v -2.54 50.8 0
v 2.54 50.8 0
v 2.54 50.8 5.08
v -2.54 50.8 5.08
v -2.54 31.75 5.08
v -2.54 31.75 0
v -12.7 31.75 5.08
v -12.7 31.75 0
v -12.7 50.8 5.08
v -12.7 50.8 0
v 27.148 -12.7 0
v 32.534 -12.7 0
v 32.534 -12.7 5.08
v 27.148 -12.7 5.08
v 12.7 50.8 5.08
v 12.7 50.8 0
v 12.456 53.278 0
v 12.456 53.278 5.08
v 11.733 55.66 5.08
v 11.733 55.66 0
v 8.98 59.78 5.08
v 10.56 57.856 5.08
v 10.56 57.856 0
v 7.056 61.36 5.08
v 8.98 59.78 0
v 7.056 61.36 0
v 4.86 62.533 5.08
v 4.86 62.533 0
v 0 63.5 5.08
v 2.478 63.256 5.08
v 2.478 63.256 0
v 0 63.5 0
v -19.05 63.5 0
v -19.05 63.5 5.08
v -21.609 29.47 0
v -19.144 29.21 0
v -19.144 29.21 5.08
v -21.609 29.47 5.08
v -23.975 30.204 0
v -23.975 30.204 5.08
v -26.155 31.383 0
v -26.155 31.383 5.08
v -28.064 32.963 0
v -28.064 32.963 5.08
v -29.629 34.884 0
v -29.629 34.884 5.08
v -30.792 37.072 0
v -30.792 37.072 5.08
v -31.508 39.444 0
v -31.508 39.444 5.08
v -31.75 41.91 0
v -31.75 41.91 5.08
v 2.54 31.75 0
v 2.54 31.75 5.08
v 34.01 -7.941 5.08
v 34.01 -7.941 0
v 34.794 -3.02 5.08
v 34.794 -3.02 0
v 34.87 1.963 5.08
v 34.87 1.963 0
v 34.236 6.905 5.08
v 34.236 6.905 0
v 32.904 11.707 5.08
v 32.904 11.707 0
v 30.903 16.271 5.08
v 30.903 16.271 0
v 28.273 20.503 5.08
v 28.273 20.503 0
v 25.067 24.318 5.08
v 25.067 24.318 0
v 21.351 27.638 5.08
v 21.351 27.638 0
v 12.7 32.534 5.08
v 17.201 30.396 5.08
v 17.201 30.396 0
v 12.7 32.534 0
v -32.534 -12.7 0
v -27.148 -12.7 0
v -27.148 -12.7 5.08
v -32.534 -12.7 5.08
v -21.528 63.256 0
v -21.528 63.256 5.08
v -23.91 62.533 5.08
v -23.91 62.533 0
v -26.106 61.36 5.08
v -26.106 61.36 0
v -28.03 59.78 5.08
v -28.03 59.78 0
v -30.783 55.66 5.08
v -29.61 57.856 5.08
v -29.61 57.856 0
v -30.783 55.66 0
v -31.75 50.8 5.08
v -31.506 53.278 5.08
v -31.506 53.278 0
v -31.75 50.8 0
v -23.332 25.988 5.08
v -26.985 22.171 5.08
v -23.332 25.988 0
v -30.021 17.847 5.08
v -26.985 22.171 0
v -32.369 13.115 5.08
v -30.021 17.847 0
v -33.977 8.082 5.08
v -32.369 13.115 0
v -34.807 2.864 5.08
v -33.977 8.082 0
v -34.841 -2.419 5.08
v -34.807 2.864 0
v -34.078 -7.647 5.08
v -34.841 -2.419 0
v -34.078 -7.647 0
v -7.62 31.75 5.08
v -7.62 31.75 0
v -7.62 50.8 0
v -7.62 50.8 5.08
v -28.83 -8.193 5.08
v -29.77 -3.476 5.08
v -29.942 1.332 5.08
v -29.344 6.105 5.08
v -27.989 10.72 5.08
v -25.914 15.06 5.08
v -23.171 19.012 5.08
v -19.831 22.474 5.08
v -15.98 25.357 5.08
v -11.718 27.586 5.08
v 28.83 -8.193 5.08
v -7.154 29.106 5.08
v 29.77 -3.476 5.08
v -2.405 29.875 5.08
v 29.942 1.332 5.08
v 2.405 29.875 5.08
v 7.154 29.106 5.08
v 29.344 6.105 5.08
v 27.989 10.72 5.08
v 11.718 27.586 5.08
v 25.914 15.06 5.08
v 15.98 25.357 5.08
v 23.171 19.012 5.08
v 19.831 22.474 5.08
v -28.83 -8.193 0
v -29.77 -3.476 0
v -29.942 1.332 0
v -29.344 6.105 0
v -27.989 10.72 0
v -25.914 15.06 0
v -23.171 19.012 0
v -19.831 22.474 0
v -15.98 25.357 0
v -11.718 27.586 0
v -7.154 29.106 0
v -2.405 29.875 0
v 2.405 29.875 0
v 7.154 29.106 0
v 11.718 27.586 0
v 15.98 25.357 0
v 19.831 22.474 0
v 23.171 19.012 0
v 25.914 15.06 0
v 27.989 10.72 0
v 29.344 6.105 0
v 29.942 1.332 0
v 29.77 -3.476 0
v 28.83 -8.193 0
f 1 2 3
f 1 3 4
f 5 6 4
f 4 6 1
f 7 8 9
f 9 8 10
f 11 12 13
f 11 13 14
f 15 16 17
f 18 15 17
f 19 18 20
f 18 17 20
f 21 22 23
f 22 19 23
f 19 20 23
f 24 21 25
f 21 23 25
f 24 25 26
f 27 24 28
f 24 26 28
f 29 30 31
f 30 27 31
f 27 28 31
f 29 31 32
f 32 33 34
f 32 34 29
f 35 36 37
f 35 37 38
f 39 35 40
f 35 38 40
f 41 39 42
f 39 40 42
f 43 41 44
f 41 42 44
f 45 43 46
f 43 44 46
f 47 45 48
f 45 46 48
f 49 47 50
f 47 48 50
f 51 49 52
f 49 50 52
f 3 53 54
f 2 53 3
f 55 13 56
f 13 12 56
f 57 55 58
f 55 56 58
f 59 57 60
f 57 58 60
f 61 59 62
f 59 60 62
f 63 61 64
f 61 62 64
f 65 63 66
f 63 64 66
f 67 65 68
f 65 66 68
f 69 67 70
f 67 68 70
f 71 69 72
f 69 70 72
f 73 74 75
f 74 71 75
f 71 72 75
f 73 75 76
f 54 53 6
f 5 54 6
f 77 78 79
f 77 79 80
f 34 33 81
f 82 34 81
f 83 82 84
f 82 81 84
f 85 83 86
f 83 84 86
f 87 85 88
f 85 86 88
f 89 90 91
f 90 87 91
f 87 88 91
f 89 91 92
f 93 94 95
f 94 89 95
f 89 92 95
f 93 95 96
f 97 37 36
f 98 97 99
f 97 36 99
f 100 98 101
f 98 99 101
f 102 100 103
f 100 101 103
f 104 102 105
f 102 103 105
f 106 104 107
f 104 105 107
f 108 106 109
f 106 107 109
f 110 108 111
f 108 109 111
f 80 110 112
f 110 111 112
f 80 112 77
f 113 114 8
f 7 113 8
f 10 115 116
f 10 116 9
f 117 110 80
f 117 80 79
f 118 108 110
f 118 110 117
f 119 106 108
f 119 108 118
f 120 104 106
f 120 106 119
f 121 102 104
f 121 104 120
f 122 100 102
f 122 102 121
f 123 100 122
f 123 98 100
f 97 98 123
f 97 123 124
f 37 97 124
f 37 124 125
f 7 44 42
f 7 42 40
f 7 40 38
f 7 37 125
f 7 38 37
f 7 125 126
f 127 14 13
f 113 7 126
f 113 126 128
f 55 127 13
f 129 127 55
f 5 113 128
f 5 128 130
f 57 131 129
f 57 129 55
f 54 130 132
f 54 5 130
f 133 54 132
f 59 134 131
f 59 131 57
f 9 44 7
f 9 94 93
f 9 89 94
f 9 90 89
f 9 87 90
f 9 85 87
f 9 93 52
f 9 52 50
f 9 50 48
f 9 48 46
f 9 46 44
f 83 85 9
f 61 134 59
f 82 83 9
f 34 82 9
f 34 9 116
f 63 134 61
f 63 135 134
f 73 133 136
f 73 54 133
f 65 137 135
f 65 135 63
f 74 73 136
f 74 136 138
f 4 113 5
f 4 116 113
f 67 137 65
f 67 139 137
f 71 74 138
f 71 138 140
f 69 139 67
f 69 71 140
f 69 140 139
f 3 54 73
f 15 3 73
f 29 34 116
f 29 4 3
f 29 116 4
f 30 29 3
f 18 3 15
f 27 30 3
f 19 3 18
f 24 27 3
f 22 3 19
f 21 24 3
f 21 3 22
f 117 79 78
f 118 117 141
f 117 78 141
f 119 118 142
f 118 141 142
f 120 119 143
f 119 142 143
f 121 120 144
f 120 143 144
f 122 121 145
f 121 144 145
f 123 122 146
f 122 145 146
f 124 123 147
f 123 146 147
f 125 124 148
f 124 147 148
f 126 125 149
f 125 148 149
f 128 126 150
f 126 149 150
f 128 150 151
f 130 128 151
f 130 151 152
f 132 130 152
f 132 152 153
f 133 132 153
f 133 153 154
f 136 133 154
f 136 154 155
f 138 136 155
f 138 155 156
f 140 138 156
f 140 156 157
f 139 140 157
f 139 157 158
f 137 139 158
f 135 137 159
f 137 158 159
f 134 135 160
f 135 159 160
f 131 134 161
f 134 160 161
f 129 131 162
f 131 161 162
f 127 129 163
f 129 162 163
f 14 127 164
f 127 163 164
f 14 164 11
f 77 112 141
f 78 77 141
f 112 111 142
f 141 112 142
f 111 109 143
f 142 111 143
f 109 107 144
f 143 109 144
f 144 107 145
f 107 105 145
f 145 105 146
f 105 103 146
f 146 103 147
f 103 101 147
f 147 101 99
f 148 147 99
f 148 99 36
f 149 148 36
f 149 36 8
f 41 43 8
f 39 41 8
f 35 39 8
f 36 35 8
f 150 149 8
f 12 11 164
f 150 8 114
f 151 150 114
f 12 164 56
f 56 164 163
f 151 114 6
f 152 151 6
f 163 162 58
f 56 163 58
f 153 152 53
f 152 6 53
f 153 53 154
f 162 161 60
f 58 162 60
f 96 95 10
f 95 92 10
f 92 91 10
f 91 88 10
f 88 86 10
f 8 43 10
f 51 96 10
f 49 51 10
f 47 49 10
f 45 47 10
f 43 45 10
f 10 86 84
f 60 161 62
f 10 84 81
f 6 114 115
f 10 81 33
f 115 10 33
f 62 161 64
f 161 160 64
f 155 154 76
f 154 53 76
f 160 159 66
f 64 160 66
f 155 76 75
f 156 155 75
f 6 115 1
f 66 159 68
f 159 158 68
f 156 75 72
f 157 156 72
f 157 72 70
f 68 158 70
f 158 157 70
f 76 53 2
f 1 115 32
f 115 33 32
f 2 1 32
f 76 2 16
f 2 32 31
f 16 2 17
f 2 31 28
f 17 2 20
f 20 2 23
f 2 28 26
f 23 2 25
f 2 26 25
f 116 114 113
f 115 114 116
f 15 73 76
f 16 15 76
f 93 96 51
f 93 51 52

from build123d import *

# Parameters (mm, degrees)
SKETCH1_R           = 34.925
BOSS_EXTRUDE1_DEPTH = 5.08
SKETCH2_W           = 25.4
SKETCH2_H           = 5.08
BOSS_EXTRUDE2_DEPTH = 63.5
SKETCH3_R           = 29.972
CUT_EXTRUDE1_DEPTH  = 50.8
SKETCH4_W           = 5.08
SKETCH4_H           = 19.05
CUT_EXTRUDE2_DEPTH  = 50.8
SKETCH5_W           = 129.040366972
SKETCH5_H           = 73.118289239
CUT_EXTRUDE3_DEPTH  = 50.8
SKETCH6_W           = 5.08
SKETCH6_H           = 34.29
BOSS_EXTRUDE3_DEPTH = 19.05
SKETCH7_W           = 5.08
SKETCH7_H           = 19.05
CUT_EXTRUDE4_DEPTH  = 19.05
FILLET1_R           = 12.7


with BuildPart() as part:
    # Sketch1 → Boss-Extrude1 (new body)
    with BuildSketch(Plane.XY):
        Circle(SKETCH1_R)
    extrude(amount=BOSS_EXTRUDE1_DEPTH)

    # Sketch2 → Boss-Extrude2 (add)
    with BuildSketch(Plane(origin=(0, 0, 0), x_dir=(1, 0, 0), z_dir=(0, 1, 0))):
        with Locations((0, -2.54)):
            Rectangle(SKETCH2_W, SKETCH2_H)
    extrude(amount=BOSS_EXTRUDE2_DEPTH)

    # Sketch3 → Cut-Extrude1 (cut)
    with BuildSketch(Plane(origin=(0, 0, 0), x_dir=(-1, 0, 0), z_dir=(0, 0, -1))):
        Circle(SKETCH3_R)
    extrude(amount=-CUT_EXTRUDE1_DEPTH, mode=Mode.SUBTRACT)

    # Sketch4 → Cut-Extrude2 (cut)
    with BuildSketch(Plane(origin=(0, 0, 0), x_dir=(-1, 0, 0), z_dir=(0, 0, -1))):
        with Locations((0, 41.275)):
            Rectangle(SKETCH4_W, SKETCH4_H)
    extrude(amount=-CUT_EXTRUDE2_DEPTH, mode=Mode.SUBTRACT)

    # Sketch5 → Cut-Extrude3 (cut)
    with BuildSketch(Plane(origin=(0, 0, 0), x_dir=(-1, 0, 0), z_dir=(0, 0, -1))):
        with Locations((0.982448892, -49.25914462)):
            Rectangle(SKETCH5_W, SKETCH5_H)
    extrude(amount=-CUT_EXTRUDE3_DEPTH, mode=Mode.SUBTRACT)

    # Sketch6 → Boss-Extrude3 (add)
    with BuildSketch(Plane.ZY.offset(12.7)):
        with Locations((2.54, 46.355)):
            Rectangle(SKETCH6_W, SKETCH6_H)
    extrude(amount=BOSS_EXTRUDE3_DEPTH)

    # Sketch7 → Cut-Extrude4 (cut)
    with BuildSketch(Plane(origin=(0, 0, 0), x_dir=(-1, 0, 0), z_dir=(0, 0, -1))):
        with Locations((10.16, 41.275)):
            Rectangle(SKETCH7_W, SKETCH7_H)
    extrude(amount=-CUT_EXTRUDE4_DEPTH, mode=Mode.SUBTRACT)

    # Fillet1
    # the kernel refuses this fillet: 12.7 mm, written as the material it takes off along each edge
    with BuildSketch(Plane(origin=(12.7, 63.5, -31.75), x_dir=(-1, 0, 0), z_dir=(0, 0, 1))) as fillet1_piece_1:
        with BuildLine():
            CenterArc((FILLET1_R, FILLET1_R), FILLET1_R, 180, 90)
            Line((0, FILLET1_R), (0, 0))
            Line((0, 0), (FILLET1_R, 0))
        make_face()
    extrude(amount=68.58, mode=Mode.SUBTRACT)
    with BuildSketch(Plane(origin=(-31.75, 63.5, -31.75), x_dir=(1, 0, 0), z_dir=(0, 0, 1))) as fillet1_piece_2:
        with BuildLine():
            CenterArc((FILLET1_R, -FILLET1_R), FILLET1_R, 90, 90)
            Line((0, -FILLET1_R), (0, 0))
            Line((0, 0), (FILLET1_R, 0))
        make_face()
    extrude(amount=68.58, mode=Mode.SUBTRACT)
    with BuildSketch(Plane(origin=(-31.75, 29.21, 36.83), x_dir=(0, 1, 0), z_dir=(0, 0, -1))) as fillet1_piece_3_section:
        with BuildLine():
            CenterArc((FILLET1_R, FILLET1_R), FILLET1_R, 180, 90)
            Line((0, FILLET1_R), (0, 0))
            Line((0, 0), (FILLET1_R, 0))
        make_face()
    fillet1_piece_3 = extrude(amount=68.58, mode=Mode.PRIVATE)
    fillet1_piece_3 = fillet1_piece_3 - Plane(origin=(0, 0, 2.54), x_dir=(1, 0, 0), z_dir=(0, 0, -1)) * Cylinder(34.925, 188, mode=Mode.PRIVATE)
    add(fillet1_piece_3, mode=Mode.SUBTRACT)


solid = part.part
